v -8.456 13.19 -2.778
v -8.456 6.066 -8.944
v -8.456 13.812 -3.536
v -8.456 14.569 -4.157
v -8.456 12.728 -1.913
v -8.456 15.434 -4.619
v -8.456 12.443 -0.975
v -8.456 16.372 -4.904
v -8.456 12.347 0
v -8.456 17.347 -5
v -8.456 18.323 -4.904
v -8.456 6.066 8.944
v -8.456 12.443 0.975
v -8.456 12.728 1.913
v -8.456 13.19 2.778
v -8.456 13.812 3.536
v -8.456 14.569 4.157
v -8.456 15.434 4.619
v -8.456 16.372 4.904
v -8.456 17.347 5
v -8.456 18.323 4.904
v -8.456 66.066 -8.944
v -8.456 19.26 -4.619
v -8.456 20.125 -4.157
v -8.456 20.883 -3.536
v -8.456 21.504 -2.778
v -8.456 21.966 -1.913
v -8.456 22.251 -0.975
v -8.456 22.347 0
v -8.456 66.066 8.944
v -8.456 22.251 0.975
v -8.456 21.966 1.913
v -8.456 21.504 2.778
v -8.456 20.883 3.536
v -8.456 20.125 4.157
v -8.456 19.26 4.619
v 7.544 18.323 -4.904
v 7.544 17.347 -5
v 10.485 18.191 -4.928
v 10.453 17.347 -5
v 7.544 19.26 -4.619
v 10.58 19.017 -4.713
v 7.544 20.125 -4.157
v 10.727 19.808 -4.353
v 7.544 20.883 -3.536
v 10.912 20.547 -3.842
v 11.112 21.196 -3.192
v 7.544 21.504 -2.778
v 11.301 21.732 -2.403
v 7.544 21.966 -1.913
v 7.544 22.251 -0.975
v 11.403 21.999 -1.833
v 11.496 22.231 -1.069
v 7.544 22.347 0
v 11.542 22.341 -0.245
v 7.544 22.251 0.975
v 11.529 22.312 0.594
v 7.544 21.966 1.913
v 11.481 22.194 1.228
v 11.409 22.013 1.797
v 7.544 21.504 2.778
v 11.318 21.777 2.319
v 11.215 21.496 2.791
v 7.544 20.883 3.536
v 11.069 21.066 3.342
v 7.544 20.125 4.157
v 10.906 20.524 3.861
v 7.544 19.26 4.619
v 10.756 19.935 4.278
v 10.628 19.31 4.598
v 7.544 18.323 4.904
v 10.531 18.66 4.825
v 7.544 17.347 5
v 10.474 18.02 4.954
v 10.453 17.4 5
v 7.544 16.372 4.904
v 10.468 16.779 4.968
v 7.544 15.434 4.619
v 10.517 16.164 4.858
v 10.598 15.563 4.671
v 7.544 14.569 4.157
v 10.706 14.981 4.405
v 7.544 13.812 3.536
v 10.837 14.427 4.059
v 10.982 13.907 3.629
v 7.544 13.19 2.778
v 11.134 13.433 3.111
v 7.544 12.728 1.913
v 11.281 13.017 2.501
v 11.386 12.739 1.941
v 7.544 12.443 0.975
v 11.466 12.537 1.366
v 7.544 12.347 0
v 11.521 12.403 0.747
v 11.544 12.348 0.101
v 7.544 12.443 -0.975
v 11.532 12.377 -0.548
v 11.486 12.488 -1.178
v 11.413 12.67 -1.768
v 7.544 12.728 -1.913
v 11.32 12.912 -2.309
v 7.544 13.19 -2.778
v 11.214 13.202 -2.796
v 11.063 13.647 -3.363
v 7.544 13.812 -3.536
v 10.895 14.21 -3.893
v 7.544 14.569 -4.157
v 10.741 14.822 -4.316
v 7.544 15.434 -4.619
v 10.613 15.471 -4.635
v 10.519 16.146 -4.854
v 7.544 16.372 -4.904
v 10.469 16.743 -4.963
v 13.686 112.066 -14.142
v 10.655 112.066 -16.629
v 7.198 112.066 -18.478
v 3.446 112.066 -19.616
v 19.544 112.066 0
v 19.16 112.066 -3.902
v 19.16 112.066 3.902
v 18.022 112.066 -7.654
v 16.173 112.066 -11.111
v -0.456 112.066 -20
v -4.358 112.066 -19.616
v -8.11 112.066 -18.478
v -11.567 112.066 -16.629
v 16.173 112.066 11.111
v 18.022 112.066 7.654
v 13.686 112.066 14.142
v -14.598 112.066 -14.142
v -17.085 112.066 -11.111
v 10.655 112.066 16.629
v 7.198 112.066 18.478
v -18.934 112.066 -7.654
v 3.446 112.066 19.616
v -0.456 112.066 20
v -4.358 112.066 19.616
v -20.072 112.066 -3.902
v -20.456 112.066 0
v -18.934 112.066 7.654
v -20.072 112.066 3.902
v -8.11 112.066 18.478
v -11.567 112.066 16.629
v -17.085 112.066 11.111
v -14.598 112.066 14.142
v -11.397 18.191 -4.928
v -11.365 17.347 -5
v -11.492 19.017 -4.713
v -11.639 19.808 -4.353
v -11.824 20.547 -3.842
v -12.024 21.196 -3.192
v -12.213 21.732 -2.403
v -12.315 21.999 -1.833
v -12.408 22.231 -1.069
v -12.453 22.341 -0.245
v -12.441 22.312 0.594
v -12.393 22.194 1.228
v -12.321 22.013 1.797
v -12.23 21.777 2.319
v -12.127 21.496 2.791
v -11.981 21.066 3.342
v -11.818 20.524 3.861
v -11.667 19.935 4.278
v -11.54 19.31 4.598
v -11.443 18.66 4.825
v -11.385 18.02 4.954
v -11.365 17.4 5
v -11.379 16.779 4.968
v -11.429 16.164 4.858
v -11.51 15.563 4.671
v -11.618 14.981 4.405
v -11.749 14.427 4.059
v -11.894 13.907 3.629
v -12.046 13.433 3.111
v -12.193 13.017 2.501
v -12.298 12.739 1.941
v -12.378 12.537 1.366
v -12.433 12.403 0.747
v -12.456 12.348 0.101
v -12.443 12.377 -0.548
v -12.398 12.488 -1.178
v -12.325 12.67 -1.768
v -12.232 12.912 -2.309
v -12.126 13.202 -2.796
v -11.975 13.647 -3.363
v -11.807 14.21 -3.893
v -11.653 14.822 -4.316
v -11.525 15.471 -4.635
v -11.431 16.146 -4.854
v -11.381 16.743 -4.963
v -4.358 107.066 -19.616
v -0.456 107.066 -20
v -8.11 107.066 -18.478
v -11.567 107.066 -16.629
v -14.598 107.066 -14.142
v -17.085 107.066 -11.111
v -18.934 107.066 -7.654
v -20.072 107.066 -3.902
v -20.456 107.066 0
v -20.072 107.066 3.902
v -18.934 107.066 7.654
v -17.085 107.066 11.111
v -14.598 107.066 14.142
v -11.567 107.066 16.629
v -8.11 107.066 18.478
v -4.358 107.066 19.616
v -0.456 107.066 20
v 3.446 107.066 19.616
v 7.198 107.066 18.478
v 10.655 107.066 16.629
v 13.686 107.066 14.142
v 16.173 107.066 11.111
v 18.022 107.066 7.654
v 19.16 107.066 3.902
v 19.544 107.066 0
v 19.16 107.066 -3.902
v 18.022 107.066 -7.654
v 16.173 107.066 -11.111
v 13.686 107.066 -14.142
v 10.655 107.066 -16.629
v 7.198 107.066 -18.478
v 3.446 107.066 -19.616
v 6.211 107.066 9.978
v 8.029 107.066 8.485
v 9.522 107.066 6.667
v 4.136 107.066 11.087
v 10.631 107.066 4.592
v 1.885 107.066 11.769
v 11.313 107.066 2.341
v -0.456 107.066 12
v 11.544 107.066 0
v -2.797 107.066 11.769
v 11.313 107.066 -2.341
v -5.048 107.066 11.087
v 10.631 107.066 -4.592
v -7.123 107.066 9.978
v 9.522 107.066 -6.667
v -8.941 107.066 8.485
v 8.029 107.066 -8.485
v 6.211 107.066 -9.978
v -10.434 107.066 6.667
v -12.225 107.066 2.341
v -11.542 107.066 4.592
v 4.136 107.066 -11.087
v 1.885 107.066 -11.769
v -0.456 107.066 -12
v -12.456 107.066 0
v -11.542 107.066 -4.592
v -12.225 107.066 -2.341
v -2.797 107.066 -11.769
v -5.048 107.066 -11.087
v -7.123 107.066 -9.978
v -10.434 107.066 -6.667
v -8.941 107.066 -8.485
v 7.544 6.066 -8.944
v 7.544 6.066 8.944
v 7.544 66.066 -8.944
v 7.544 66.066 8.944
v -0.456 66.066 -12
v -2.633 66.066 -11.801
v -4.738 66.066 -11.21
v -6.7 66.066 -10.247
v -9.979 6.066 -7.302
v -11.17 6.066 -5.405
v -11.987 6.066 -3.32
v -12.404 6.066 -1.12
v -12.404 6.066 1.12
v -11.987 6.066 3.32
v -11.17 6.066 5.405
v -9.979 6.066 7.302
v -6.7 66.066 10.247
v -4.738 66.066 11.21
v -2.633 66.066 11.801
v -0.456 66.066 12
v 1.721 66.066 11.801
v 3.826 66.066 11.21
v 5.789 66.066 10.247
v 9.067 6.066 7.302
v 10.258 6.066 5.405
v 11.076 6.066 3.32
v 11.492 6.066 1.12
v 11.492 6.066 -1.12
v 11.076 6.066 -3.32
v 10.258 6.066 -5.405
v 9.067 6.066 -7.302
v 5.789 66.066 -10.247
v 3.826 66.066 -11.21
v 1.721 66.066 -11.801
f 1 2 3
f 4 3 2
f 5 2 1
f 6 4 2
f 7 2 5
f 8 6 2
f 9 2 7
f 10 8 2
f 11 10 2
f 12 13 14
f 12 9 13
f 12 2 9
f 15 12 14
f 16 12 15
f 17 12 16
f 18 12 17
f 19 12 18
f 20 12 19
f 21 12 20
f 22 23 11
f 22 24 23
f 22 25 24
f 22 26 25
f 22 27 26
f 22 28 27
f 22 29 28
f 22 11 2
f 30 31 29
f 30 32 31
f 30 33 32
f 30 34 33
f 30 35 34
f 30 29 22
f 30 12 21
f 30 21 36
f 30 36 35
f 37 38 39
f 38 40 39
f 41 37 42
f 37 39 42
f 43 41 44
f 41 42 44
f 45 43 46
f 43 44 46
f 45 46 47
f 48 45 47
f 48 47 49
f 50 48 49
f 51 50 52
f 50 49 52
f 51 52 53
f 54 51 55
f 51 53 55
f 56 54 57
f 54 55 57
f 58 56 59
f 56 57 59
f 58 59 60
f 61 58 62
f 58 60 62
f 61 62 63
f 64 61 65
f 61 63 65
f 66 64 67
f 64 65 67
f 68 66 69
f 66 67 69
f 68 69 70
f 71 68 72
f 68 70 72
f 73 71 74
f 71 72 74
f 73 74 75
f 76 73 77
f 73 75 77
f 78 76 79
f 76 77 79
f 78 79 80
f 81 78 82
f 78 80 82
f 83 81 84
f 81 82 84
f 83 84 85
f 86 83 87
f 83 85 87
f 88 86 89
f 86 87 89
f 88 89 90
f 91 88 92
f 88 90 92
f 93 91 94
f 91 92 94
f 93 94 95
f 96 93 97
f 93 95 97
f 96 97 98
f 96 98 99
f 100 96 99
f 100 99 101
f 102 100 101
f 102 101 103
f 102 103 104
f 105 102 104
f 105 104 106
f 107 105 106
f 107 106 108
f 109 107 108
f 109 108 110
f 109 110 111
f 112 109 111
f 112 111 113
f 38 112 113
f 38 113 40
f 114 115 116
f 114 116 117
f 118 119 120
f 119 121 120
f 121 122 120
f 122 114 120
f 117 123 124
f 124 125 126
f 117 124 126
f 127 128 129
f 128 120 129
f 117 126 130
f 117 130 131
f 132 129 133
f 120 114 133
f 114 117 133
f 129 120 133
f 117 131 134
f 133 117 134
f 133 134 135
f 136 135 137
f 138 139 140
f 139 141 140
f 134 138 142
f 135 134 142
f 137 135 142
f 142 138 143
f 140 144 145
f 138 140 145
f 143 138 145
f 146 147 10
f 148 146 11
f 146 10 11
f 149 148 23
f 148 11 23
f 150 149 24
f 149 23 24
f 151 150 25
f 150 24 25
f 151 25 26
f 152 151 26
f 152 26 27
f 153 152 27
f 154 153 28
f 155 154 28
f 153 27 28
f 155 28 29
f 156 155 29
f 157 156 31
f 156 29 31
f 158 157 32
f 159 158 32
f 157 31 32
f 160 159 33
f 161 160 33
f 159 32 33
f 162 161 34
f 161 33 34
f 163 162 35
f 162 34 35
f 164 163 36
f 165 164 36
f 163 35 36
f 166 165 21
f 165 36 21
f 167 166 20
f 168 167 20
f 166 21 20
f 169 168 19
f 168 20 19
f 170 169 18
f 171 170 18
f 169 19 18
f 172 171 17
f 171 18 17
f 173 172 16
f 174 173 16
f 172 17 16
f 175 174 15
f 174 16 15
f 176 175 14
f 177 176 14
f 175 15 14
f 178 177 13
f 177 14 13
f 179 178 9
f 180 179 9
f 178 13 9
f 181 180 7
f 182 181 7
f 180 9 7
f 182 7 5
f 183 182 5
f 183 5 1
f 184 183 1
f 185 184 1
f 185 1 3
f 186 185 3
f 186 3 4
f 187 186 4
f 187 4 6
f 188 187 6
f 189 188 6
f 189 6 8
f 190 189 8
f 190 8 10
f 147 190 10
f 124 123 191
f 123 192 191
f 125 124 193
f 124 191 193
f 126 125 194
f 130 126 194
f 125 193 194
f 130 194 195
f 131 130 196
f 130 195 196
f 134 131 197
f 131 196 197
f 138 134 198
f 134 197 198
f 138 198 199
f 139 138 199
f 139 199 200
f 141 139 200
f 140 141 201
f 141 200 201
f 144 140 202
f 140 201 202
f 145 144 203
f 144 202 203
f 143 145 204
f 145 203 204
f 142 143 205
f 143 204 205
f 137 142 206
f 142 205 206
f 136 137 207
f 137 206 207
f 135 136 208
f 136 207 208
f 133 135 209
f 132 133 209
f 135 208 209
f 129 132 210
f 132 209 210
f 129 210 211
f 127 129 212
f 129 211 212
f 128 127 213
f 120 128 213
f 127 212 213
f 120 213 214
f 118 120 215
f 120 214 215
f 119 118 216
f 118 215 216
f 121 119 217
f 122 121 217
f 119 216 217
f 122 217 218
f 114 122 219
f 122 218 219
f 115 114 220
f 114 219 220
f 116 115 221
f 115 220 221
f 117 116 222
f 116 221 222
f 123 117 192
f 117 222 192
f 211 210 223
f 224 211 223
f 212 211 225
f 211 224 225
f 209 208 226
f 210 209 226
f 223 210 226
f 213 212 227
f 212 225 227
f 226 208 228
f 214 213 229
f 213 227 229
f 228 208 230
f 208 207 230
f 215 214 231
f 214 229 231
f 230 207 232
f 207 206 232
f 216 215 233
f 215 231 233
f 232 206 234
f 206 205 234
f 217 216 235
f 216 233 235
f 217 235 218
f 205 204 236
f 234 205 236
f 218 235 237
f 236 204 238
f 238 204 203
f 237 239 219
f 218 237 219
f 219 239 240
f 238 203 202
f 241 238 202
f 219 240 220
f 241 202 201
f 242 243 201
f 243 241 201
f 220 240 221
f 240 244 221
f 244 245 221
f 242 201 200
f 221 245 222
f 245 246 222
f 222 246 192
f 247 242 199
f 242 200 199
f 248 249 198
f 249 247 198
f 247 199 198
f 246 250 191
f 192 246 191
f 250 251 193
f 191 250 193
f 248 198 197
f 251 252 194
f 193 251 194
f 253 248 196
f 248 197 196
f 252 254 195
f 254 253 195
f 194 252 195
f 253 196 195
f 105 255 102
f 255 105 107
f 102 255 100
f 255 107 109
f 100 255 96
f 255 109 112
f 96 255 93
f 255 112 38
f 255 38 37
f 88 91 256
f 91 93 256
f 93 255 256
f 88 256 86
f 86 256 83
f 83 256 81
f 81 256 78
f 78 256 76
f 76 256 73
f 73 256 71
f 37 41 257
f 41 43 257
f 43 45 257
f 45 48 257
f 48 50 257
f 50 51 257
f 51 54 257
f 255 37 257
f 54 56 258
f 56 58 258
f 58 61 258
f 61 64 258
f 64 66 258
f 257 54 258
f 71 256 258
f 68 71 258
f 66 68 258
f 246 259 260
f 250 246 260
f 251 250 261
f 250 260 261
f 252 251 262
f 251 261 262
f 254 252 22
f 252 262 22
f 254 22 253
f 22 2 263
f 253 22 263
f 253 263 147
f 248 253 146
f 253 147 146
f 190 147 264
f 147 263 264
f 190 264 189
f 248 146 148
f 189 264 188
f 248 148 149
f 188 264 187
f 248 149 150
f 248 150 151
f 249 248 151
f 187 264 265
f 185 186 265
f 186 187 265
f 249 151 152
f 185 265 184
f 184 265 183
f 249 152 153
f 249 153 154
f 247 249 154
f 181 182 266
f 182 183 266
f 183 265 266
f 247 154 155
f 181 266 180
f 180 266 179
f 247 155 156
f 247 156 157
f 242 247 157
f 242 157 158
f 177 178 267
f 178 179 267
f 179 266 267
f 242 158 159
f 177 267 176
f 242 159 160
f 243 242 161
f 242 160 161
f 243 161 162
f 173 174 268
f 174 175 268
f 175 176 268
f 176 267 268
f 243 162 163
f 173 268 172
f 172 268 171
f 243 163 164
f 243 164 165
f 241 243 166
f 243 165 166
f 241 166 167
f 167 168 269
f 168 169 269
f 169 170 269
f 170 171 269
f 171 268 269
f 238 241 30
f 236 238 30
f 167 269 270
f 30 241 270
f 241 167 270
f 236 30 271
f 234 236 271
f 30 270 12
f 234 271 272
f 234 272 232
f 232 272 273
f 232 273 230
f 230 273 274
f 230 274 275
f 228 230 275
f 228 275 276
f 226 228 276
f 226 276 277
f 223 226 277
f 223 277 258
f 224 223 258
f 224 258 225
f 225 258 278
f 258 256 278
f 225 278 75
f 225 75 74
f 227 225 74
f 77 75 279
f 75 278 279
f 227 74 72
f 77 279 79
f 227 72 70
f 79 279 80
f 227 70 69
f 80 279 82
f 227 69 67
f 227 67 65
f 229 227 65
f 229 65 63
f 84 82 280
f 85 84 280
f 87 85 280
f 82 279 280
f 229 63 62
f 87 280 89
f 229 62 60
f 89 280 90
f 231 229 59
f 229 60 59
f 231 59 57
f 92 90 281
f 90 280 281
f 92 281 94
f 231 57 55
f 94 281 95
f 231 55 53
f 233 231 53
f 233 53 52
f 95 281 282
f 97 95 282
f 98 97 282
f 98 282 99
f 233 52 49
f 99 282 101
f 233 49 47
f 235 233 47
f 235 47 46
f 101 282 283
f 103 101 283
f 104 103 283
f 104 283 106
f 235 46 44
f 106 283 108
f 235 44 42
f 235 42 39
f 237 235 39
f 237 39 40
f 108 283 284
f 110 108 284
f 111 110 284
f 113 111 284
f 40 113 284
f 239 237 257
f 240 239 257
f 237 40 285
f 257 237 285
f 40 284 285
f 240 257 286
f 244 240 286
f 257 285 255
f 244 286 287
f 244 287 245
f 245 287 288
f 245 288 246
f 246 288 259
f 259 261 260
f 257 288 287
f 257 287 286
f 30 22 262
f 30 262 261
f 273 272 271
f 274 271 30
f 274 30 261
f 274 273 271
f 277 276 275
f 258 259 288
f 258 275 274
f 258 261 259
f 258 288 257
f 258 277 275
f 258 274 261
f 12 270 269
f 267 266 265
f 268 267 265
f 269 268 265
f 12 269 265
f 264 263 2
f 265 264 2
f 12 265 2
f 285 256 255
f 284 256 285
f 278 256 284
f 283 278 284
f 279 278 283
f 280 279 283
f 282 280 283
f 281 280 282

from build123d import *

# Parameters (mm, degrees)
SKETCH_4_W          = 16
SKETCH_4_H          = 70
CUT_EXTRUDE_1_DEPTH = 15
SKETCH_6_R          = 5
CUT_EXTRUDE_2_DEPTH = 15


with BuildPart() as part:
    # 草图1 → 旋转1 (revolve)
    with BuildSketch(Plane.XY, mode=Mode.PRIVATE) as revolve_1_sk:
        Polygon((-0.455930312, 112.0664832), (19.544069688, 112.0664832), (19.544069688, 107.0664832), (11.544069688, 107.0664832), (11.544069688, 6.0664832), (-0.455930312, 6.0664832), align=None)
    revolve(revolve_1_sk.sketch.rotate(Axis((-0.455930312, 6.0664832, 0), (0, 1, 0)), 90), axis=Axis((-0.455930312, 6.0664832, 0), (0, 1, 0)))

    # 草图4 → 切除-拉伸1 (cut, symmetric)
    with BuildSketch(Plane.XY):
        with Locations((-0.455930312, 31.0664832)):
            Rectangle(SKETCH_4_W, SKETCH_4_H)
    extrude(amount=CUT_EXTRUDE_1_DEPTH, both=True, mode=Mode.SUBTRACT)

    # 草图6 → 切除-拉伸2 (cut, symmetric)
    with BuildSketch(Plane(origin=(0, 0, 0), x_dir=(0, 0, -1), z_dir=(1, 0, 0))):
        with Locations((0, 17.347075097)):
            Circle(SKETCH_6_R)
    extrude(amount=CUT_EXTRUDE_2_DEPTH, both=True, mode=Mode.SUBTRACT)


solid = part.part
